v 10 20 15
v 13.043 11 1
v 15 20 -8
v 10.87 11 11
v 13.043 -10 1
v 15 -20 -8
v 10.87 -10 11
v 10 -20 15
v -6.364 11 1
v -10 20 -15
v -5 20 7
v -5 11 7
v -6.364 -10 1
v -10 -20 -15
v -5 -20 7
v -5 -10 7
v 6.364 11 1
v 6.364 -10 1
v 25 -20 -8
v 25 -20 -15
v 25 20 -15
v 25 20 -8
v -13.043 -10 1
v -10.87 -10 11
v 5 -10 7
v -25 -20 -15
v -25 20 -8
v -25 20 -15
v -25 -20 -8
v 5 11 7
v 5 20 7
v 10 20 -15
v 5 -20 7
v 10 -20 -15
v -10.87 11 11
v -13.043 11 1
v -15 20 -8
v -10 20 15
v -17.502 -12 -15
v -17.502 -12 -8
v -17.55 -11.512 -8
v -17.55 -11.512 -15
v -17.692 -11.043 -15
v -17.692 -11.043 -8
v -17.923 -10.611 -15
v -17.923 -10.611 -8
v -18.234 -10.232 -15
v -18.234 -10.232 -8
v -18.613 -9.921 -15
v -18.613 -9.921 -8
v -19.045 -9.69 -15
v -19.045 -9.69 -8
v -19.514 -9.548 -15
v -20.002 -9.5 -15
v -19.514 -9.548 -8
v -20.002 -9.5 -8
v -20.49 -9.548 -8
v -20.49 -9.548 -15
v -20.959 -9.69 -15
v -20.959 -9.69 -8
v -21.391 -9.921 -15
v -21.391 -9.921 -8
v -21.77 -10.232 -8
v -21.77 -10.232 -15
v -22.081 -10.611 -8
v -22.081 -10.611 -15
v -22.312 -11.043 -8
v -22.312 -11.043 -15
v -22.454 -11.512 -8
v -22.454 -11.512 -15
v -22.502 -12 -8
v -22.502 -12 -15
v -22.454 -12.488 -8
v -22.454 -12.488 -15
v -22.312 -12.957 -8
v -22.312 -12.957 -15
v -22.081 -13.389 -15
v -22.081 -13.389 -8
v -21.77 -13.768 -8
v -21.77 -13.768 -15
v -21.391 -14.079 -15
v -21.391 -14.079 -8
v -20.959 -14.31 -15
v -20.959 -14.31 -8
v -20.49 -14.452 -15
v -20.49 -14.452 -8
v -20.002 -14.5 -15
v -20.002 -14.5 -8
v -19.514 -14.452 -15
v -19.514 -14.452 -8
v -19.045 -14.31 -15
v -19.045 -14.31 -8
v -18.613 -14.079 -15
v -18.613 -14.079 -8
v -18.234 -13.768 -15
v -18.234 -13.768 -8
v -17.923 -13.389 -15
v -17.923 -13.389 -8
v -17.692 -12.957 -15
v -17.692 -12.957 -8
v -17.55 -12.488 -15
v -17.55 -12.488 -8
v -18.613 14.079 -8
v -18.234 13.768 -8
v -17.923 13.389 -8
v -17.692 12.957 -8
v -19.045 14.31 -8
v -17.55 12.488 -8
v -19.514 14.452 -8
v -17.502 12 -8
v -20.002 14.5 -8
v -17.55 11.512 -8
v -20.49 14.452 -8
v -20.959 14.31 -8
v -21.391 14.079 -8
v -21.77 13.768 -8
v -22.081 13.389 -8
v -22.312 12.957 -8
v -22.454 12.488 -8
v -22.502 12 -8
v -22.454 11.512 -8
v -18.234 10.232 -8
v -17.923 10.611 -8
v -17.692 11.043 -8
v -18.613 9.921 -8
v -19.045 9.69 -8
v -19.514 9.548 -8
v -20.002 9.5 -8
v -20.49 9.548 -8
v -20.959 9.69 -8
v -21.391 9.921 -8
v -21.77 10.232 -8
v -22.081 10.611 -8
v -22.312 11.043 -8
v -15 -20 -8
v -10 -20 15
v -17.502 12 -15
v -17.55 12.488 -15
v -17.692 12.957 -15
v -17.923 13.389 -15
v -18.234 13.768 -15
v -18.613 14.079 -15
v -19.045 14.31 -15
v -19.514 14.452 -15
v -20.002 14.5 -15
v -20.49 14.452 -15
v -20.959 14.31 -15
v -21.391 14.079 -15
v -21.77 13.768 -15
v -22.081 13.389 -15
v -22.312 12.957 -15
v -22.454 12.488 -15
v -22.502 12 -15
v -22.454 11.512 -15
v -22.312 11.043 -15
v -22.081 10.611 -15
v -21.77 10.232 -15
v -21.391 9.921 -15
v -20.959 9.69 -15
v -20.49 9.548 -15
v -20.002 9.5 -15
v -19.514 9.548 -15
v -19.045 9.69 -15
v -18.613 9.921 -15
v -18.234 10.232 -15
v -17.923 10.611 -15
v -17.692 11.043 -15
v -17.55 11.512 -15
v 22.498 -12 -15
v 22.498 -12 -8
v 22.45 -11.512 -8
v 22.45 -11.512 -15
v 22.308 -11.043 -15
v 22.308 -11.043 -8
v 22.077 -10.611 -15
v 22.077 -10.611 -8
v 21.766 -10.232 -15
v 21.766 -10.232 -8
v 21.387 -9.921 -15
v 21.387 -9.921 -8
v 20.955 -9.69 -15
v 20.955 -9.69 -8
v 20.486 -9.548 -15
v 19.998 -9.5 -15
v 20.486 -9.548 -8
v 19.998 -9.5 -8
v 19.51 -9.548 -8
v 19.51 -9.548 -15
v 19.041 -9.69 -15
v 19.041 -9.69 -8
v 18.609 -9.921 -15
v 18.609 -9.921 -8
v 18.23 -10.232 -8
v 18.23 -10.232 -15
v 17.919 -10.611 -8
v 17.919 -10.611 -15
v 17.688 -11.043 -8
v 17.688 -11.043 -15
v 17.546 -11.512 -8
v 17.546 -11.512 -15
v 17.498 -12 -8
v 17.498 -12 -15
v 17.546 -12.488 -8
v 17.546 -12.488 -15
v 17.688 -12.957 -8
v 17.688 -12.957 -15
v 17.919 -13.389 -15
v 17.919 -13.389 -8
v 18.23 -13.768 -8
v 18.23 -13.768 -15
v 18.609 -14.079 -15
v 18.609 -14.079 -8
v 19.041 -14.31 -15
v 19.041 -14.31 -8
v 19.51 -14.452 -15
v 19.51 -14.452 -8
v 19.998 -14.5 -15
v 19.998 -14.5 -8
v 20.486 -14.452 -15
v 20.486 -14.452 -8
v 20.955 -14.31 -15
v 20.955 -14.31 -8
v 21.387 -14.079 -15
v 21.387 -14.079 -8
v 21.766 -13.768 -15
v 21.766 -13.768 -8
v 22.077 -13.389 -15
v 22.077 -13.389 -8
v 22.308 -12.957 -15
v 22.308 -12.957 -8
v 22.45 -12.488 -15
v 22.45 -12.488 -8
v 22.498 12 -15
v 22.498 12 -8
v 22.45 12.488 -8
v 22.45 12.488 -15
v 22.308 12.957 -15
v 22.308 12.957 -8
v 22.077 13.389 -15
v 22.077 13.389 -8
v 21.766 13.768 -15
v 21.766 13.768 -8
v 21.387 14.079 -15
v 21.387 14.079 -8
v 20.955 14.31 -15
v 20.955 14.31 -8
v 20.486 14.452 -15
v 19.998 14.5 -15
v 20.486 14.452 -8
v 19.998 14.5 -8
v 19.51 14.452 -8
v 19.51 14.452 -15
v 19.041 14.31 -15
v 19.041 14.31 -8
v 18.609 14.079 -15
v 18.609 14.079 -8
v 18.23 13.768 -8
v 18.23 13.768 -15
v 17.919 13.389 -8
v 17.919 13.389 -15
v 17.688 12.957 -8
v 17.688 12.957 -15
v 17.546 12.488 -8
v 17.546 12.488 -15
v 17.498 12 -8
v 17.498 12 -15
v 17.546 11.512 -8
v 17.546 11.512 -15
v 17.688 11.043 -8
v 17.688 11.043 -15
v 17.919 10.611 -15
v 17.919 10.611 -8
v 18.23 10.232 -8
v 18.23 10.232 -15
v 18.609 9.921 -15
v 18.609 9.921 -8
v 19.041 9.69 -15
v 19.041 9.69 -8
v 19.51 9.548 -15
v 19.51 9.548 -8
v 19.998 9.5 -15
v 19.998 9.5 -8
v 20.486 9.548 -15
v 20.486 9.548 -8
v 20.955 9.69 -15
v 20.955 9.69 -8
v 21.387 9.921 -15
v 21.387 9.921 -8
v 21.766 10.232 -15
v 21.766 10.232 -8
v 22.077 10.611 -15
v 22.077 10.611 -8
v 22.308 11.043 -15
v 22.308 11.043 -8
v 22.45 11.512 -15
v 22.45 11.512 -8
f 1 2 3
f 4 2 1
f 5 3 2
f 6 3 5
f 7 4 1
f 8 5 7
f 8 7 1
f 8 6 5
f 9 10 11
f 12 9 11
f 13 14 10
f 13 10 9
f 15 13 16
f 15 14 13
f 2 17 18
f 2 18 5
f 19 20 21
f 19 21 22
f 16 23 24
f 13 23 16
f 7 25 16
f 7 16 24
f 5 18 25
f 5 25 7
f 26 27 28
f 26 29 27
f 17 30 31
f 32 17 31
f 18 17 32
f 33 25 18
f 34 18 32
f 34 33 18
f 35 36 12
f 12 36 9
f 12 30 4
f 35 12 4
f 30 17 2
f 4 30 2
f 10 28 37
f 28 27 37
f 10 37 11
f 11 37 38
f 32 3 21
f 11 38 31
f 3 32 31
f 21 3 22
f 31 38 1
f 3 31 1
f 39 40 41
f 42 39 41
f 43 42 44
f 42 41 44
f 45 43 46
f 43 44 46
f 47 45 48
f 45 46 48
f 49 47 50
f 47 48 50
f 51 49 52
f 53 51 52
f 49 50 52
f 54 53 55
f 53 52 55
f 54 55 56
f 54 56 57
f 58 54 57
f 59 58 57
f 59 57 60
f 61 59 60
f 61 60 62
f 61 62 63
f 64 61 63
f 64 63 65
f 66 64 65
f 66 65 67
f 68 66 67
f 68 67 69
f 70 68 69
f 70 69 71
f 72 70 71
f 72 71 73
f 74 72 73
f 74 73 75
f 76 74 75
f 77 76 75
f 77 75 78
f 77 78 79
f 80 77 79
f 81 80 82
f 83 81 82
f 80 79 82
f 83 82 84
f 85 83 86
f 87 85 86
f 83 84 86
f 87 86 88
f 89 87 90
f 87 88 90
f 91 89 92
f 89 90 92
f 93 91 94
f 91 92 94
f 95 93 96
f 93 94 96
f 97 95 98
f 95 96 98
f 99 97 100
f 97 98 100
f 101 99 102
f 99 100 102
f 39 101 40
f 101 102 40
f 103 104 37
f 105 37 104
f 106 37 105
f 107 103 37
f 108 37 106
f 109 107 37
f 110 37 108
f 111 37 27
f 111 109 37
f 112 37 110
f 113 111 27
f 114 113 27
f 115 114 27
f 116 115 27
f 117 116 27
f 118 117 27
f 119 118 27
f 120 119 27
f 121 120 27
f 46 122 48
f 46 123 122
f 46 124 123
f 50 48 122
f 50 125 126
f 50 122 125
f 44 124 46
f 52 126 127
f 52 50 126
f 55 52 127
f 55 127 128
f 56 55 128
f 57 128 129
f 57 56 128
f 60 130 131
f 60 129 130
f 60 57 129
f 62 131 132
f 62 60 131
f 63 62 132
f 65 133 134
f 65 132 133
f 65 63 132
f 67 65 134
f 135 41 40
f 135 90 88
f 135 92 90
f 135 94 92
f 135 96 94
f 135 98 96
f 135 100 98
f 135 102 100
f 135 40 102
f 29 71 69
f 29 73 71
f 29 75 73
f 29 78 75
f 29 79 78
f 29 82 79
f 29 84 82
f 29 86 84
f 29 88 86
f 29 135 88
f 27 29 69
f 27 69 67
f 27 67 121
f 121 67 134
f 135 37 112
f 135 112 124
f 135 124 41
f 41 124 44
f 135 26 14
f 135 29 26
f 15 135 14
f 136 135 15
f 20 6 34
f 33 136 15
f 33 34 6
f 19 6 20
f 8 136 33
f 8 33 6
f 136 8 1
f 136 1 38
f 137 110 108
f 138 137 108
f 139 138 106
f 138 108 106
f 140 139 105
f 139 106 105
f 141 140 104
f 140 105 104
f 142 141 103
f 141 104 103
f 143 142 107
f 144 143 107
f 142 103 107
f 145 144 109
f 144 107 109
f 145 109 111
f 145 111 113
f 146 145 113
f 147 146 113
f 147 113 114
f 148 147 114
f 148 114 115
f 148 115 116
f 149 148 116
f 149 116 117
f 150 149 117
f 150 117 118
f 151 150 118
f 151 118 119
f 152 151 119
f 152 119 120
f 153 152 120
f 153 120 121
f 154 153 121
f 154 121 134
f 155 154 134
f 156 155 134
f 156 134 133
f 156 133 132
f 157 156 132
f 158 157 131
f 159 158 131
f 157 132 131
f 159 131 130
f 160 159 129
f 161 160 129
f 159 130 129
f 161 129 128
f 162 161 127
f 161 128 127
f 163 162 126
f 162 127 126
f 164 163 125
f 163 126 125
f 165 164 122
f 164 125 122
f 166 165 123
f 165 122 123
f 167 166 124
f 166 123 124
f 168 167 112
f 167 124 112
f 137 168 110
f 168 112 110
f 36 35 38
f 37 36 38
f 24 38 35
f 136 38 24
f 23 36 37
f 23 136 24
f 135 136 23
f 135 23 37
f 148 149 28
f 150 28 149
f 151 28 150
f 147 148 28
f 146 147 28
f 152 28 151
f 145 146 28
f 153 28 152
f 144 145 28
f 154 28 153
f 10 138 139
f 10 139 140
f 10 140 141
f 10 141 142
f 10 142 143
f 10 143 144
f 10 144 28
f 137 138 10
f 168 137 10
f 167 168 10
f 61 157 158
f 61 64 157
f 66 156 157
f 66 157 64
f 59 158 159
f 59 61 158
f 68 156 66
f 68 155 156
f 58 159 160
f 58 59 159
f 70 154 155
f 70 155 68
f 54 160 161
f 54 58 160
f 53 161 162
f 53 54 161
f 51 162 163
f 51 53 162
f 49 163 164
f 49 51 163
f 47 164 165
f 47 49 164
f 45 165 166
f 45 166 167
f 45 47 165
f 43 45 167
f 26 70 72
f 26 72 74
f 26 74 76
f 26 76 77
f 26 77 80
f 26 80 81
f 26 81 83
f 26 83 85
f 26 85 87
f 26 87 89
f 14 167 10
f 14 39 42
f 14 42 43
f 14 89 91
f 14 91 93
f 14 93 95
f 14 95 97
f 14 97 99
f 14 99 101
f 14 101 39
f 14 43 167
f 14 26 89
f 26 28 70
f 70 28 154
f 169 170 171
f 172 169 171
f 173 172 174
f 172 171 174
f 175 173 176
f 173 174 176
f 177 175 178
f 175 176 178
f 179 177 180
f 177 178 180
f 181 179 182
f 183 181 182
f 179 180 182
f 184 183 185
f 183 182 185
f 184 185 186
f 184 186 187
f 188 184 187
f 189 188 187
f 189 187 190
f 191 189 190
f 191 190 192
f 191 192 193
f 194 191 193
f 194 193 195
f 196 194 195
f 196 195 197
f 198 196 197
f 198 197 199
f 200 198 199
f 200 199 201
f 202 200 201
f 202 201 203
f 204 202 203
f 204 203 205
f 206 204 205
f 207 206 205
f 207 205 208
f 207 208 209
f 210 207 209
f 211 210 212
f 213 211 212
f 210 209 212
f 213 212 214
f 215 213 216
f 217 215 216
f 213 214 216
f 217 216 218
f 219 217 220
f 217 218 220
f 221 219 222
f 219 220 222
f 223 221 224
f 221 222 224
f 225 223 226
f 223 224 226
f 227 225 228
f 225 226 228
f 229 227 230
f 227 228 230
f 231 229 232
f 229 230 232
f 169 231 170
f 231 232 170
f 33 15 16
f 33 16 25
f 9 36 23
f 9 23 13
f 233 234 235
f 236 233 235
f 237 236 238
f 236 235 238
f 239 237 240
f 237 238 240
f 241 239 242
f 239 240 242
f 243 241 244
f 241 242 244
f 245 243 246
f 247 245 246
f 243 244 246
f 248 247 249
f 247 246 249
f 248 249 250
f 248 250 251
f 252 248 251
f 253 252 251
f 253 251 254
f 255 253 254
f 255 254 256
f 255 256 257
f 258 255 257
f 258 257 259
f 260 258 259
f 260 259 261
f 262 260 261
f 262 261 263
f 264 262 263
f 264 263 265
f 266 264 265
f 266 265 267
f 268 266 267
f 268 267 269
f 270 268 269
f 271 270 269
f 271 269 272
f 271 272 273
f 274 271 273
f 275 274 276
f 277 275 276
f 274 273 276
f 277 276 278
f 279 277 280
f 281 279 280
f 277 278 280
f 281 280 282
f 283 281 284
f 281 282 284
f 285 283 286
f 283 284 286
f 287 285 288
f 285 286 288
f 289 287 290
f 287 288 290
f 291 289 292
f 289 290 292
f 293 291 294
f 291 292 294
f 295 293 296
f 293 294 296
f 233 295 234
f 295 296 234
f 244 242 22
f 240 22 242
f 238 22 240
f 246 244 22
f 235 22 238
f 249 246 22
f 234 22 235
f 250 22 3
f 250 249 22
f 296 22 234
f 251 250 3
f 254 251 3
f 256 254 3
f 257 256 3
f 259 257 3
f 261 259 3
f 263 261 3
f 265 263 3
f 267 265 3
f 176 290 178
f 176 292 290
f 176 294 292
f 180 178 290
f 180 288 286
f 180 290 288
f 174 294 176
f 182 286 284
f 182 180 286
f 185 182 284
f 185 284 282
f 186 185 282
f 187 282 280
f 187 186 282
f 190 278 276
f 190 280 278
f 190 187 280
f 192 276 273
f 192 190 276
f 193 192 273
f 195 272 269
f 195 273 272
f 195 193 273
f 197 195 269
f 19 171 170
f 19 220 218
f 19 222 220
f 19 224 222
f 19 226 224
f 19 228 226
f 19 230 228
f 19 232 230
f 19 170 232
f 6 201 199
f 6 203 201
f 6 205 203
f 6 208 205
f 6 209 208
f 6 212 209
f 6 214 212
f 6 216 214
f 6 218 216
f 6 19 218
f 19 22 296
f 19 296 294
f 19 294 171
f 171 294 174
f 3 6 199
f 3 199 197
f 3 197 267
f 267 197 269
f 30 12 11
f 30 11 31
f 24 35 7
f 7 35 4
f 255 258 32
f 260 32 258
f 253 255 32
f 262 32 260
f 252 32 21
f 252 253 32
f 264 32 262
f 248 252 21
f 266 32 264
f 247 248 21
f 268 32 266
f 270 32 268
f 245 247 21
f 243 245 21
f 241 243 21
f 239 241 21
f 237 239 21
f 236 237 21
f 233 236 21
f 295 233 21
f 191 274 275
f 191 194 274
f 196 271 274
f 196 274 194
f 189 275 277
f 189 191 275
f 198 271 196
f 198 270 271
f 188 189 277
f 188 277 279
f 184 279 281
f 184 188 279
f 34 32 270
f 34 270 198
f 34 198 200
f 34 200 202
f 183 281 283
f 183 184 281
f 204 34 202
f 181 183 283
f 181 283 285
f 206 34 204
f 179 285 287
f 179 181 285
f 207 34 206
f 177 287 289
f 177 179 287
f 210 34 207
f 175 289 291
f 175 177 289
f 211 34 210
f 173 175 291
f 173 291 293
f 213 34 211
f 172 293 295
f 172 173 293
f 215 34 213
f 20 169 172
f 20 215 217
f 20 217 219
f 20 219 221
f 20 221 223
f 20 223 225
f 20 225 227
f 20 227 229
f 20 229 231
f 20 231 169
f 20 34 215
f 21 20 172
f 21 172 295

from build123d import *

# Parameters (mm, degrees)
BOX_W        = 31
BOX_H        = 21
BOX_DEPTH    = 10
PAD_DEPTH    = 20
SKETCH002_R  = 2.5
POCKET_DEPTH = 7.001


with BuildPart() as cubo:
    # Box → Box (new body)
    with BuildSketch(Plane(origin=(-15, -10, 1), x_dir=(1, 0, 0), z_dir=(0, 0, 1))):
        with Locations((15.5, 10.5)):
            Rectangle(BOX_W, BOX_H)
    extrude(amount=BOX_DEPTH)


with BuildPart() as pocket:
    # Sketch → Pad (new body, symmetric)
    with BuildSketch(Plane.XZ):
        Polygon((-25, -15), (-10, -15), (-5, 7), (5, 7), (10, -15), (25, -15), (25, -8), (15, -8), (10, 15), (-10, 15), (-15, -8), (-25, -8), align=None)
    extrude(amount=PAD_DEPTH, both=True)

    # Cut: cut Cubo
    add(cubo.part, mode=Mode.SUBTRACT)

    # Sketch002 → Pocket (cut, through all)
    with BuildSketch(Plane.XY.offset(-8)):
        with Locations((-20.002137, 12)):
            Circle(SKETCH002_R)
        with Locations((-20.002137, -12)):
            Circle(SKETCH002_R)
        with Locations((19.997863, 12)):
            Circle(SKETCH002_R)
        with Locations((19.997863, -12)):
            Circle(SKETCH002_R)
    extrude(amount=-POCKET_DEPTH, mode=Mode.SUBTRACT)


solid = pocket.part
